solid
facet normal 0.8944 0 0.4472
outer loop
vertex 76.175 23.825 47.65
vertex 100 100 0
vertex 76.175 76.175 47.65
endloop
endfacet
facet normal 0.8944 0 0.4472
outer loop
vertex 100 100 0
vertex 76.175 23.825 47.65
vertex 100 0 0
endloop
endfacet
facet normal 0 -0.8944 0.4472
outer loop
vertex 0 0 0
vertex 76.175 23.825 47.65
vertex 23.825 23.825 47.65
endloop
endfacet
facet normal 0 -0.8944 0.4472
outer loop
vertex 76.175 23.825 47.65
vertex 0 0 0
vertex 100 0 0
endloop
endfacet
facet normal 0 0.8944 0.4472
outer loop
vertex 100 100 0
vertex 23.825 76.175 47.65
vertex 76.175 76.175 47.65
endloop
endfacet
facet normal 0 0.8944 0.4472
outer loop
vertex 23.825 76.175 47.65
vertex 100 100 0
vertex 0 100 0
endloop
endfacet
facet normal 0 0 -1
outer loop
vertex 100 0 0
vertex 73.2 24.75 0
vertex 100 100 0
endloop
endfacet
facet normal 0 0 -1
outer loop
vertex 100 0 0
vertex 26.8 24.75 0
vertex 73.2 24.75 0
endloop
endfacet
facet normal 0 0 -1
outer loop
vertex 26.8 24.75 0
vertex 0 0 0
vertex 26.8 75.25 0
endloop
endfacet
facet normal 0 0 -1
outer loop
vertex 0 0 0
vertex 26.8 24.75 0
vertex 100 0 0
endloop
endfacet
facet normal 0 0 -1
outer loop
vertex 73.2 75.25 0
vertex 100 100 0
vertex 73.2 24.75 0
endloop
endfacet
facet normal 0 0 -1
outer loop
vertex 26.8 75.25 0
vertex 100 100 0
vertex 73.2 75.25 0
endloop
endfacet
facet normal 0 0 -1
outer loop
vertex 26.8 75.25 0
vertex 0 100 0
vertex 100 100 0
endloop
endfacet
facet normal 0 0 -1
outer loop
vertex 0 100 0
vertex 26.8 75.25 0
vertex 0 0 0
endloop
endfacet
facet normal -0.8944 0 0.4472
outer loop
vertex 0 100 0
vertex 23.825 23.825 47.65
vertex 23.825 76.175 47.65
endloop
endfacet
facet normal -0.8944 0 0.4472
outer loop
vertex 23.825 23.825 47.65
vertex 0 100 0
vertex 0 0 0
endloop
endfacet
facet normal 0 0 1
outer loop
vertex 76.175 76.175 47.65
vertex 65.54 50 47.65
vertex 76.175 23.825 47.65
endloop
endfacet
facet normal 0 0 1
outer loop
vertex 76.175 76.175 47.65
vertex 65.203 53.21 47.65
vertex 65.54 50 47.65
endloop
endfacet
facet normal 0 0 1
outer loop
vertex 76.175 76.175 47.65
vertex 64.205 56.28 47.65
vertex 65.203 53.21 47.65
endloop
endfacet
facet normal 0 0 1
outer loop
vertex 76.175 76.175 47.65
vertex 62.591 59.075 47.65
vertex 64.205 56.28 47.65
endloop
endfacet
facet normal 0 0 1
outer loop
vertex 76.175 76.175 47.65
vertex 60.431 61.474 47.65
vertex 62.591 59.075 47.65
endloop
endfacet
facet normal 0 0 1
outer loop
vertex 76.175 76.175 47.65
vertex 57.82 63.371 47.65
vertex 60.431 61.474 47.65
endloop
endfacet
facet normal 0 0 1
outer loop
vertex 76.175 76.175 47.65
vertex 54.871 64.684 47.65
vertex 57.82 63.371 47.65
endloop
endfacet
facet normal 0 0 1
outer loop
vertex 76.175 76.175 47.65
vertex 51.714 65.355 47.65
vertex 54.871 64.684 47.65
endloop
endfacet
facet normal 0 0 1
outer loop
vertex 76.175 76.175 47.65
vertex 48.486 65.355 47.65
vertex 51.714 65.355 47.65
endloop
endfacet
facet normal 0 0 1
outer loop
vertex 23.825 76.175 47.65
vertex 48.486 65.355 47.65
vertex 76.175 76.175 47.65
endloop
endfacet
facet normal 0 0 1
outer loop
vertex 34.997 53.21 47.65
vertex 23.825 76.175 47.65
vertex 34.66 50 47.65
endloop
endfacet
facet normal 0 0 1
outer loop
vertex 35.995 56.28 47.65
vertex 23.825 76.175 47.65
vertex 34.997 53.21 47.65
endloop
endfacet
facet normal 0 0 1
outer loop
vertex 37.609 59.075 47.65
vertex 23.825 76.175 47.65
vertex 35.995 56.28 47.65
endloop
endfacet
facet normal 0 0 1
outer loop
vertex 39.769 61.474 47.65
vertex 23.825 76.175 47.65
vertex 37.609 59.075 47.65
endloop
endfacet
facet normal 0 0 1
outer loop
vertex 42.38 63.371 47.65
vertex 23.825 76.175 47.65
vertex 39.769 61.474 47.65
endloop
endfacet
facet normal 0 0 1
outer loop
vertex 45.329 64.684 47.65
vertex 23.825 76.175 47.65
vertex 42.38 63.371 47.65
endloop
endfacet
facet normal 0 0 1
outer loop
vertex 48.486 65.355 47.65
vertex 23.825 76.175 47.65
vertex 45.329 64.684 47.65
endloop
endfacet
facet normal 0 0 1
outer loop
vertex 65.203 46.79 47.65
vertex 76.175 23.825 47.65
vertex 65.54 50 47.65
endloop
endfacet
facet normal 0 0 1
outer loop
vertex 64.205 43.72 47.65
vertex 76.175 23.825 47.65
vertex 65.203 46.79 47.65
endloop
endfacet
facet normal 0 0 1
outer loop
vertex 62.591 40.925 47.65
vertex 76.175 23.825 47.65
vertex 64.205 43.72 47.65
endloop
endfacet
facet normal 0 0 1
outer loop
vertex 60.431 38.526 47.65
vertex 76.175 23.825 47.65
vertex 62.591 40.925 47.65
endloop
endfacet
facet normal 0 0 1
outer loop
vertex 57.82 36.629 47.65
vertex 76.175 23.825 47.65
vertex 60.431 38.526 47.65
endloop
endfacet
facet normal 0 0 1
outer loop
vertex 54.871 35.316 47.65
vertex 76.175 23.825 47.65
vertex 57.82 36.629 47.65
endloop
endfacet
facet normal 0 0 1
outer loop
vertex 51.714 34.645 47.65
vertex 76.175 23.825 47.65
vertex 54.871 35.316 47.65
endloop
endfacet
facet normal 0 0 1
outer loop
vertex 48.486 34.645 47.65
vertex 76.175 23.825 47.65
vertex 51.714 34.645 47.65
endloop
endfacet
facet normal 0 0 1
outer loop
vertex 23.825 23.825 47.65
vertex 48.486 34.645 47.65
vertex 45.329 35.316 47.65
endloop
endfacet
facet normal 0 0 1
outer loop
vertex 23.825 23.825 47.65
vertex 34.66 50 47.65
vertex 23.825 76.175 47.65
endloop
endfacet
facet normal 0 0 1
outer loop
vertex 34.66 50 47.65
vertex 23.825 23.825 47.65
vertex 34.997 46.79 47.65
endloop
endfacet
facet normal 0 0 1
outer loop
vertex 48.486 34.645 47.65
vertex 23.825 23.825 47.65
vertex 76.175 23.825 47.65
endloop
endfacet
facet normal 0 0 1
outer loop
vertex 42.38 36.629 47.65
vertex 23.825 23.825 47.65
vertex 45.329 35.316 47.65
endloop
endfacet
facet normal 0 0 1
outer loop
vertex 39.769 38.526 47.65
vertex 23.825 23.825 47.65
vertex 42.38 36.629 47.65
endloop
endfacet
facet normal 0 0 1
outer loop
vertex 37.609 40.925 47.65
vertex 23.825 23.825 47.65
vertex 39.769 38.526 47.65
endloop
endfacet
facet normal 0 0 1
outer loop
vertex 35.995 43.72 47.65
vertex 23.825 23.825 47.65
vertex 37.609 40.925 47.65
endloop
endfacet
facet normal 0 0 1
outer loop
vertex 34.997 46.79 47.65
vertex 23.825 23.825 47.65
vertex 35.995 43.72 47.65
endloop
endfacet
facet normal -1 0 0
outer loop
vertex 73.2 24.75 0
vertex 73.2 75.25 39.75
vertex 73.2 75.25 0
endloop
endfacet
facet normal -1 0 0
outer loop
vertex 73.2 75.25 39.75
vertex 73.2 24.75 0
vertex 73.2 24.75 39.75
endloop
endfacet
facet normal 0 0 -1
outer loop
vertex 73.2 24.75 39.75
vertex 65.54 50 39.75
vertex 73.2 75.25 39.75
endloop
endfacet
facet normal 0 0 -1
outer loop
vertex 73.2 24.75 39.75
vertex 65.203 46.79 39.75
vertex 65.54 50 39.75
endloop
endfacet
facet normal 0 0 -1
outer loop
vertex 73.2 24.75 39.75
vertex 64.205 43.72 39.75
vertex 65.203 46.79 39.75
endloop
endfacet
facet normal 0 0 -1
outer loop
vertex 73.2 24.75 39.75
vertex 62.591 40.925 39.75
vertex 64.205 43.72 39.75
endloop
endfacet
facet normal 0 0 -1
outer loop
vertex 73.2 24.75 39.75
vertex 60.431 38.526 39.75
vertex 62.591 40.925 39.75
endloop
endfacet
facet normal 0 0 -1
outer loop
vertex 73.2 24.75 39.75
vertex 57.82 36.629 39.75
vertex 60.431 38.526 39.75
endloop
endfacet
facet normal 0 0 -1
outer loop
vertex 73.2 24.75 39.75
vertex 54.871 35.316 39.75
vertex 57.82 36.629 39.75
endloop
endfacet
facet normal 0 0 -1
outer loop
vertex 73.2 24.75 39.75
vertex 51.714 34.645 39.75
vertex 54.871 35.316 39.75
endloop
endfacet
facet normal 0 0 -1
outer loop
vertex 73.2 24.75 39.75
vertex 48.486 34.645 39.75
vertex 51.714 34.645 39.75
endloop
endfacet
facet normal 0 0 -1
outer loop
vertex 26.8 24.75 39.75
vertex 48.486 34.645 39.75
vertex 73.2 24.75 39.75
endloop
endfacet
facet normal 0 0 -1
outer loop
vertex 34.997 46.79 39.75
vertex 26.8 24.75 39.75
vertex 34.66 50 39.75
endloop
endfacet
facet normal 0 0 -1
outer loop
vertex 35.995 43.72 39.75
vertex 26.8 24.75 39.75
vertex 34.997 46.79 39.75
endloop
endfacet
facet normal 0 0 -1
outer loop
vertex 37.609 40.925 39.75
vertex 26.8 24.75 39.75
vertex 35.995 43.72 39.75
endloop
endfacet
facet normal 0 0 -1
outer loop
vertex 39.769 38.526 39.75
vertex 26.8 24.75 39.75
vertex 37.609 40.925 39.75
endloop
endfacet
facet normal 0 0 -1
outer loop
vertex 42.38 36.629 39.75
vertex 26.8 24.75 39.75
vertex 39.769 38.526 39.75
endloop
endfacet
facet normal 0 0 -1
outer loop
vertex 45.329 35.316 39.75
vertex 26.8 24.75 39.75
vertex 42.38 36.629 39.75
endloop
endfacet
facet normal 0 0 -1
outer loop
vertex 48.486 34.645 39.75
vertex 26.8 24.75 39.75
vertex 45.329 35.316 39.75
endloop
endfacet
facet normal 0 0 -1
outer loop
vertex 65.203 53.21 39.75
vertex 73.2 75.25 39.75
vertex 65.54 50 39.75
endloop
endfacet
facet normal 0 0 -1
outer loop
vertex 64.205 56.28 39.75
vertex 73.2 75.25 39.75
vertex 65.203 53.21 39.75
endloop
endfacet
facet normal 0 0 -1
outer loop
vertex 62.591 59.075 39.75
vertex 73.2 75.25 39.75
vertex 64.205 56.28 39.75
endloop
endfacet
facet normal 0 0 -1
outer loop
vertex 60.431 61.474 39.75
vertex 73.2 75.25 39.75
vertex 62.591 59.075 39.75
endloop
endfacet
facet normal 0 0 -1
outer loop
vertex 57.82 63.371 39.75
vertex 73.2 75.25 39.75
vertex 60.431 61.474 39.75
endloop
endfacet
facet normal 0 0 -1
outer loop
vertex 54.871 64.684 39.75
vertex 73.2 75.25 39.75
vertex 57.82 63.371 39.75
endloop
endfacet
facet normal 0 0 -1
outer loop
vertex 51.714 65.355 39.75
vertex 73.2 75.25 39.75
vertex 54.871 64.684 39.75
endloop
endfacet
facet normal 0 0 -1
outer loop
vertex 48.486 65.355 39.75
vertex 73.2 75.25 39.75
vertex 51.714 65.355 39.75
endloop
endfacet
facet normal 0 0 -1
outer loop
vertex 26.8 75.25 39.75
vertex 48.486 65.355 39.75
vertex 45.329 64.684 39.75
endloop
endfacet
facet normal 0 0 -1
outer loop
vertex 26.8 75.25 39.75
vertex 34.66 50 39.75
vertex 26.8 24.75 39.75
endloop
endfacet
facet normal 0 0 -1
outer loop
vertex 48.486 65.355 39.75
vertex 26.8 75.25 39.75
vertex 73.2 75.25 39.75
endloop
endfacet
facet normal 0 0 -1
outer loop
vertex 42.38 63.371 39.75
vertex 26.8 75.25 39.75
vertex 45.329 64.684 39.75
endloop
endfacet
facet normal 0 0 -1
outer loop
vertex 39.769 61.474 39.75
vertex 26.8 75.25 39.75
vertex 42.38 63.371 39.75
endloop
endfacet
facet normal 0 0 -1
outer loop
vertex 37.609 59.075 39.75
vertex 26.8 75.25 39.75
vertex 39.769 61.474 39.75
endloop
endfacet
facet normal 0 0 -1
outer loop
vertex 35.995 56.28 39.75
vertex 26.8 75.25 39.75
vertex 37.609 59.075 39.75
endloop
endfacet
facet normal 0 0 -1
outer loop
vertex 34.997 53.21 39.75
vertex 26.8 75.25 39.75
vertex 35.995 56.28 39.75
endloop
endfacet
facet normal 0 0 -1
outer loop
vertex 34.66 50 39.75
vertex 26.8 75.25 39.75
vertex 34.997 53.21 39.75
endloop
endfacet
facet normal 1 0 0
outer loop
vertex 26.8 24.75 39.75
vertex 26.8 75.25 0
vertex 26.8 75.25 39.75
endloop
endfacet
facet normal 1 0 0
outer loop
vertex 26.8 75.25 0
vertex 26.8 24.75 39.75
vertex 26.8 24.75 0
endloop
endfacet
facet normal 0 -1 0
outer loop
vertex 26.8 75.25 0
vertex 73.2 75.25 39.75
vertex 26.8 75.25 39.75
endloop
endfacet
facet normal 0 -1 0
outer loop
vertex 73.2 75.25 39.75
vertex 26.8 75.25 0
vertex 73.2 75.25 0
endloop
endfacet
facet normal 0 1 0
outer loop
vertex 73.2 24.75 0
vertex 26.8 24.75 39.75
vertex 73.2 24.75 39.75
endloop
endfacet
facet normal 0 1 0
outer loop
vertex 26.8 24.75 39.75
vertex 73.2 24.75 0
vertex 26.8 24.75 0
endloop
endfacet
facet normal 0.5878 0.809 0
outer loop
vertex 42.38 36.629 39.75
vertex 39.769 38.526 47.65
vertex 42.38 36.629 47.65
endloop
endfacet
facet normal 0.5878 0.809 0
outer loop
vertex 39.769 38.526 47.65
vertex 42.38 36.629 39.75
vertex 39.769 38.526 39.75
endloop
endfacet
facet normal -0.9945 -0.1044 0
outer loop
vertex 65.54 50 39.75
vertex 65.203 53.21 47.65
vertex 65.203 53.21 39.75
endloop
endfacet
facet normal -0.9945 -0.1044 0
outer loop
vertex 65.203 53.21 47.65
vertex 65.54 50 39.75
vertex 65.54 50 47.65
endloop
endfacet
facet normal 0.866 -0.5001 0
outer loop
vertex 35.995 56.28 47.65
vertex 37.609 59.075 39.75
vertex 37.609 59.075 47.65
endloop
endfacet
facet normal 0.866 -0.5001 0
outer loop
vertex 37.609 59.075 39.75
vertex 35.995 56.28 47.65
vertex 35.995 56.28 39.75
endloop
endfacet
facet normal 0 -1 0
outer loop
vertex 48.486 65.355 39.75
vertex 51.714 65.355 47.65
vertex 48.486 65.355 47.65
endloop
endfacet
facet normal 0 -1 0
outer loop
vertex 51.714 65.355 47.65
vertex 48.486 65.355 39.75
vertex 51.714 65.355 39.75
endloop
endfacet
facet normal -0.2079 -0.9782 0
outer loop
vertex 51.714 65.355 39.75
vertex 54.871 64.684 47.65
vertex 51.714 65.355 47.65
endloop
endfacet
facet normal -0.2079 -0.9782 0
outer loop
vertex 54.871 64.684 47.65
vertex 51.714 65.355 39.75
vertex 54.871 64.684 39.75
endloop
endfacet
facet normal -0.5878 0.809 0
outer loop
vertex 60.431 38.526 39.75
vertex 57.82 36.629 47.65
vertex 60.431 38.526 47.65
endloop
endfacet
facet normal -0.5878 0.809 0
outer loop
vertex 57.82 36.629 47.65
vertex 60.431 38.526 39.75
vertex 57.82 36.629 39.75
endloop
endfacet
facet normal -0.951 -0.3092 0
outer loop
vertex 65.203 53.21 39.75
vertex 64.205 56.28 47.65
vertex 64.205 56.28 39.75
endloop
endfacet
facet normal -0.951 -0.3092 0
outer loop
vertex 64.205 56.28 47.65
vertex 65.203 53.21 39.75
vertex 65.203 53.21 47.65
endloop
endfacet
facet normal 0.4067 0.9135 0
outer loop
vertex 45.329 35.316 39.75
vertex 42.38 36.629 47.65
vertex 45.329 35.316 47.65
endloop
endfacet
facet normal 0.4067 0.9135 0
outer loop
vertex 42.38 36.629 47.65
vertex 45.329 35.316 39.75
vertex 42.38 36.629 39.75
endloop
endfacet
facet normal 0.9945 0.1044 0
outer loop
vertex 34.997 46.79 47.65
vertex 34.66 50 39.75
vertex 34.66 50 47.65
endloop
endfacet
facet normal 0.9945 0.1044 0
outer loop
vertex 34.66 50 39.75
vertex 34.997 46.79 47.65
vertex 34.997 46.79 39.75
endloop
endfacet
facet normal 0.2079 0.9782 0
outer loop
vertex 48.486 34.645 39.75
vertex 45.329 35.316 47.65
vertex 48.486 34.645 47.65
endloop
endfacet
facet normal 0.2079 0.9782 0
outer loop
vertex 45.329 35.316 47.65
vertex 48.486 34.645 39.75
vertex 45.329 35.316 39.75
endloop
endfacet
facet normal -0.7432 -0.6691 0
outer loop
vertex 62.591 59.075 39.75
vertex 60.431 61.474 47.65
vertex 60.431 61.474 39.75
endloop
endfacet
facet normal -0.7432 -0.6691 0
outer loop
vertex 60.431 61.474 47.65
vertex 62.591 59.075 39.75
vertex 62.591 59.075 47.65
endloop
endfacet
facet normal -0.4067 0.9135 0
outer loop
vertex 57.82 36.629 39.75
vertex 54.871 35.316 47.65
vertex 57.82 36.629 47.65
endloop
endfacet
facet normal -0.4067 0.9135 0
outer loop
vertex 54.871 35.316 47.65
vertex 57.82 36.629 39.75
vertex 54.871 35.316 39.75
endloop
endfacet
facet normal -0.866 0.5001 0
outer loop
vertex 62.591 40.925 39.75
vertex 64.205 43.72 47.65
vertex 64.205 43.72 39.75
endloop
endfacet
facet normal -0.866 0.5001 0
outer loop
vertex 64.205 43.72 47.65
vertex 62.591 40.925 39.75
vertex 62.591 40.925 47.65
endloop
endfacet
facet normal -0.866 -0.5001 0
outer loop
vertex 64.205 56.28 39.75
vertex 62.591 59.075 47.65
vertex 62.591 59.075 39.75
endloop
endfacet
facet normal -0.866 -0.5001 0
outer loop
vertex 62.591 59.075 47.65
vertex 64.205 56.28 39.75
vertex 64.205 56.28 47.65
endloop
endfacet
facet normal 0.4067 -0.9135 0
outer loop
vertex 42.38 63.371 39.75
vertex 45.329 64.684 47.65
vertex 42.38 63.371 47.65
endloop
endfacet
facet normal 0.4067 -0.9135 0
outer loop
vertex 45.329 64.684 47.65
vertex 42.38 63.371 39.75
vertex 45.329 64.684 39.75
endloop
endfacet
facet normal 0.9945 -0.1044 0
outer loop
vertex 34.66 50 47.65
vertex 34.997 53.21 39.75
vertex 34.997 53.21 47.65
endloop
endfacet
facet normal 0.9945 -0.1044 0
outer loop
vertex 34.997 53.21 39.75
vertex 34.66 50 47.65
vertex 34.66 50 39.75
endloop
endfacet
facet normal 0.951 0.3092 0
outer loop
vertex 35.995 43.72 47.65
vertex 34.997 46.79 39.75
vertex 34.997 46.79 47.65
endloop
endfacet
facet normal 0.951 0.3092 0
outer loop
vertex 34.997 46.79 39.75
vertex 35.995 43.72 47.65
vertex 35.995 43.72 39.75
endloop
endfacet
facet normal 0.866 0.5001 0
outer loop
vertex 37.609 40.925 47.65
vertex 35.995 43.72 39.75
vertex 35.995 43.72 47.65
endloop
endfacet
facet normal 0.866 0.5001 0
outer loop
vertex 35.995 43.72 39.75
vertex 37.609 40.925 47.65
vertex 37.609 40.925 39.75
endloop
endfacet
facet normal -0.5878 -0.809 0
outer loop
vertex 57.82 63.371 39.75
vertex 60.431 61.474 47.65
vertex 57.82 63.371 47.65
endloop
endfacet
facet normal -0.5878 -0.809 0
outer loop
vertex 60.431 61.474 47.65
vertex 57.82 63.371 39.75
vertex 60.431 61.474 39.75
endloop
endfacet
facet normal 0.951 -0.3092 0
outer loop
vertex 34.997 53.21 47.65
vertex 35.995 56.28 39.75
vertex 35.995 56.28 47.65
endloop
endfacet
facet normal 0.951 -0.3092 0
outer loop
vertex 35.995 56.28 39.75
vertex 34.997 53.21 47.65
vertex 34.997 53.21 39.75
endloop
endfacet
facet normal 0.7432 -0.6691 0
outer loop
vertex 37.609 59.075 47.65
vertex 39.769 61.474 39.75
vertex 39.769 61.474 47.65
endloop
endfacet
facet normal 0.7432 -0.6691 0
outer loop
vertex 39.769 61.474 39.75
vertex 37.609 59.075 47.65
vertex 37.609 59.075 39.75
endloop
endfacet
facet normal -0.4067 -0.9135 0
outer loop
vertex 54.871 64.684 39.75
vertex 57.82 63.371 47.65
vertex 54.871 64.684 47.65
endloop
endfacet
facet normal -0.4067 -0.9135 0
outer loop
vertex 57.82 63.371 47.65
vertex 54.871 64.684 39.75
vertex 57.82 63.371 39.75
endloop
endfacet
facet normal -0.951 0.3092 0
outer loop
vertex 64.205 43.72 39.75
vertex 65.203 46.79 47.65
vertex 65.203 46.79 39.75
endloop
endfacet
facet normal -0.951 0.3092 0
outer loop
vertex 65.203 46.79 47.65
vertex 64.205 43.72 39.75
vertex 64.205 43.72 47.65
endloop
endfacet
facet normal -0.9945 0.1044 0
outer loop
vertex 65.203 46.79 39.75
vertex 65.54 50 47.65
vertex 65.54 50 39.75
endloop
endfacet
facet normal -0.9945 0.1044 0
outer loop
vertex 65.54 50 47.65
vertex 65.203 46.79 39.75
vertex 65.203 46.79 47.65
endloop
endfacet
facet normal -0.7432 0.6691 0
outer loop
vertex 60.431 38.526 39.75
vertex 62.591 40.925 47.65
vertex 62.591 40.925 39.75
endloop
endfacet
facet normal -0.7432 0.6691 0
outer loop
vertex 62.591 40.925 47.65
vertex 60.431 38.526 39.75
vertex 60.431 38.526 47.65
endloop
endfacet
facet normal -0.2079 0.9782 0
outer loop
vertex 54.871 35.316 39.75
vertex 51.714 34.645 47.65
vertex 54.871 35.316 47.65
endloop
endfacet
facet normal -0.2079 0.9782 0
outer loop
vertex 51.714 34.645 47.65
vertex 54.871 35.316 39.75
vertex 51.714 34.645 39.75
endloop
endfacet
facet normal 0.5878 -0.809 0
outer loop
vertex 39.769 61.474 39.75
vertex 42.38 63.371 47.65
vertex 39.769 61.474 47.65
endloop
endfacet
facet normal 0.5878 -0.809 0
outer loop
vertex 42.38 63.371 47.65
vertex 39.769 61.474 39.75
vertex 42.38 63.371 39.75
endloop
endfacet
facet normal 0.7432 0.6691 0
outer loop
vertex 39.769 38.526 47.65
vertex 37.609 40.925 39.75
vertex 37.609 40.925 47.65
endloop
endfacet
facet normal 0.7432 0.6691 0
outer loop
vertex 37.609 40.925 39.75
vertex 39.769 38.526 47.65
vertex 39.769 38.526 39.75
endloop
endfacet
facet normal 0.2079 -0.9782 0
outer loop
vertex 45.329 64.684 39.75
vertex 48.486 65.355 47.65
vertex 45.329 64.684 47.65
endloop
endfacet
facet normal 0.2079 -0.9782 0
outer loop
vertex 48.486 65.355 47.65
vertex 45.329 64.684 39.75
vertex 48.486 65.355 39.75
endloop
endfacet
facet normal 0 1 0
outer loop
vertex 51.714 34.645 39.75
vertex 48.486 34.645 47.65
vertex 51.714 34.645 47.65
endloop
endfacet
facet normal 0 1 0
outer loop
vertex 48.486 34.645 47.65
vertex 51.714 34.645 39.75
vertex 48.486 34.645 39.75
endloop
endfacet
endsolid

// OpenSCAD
pyramidSide = 100;
module button(){
//actual 45.37, 49.57, 38.75
//cylinder actual diameter: 29.88, 
// distance from nut: 7.9
cube([46.4,50.5,39.75]);
translate([23.3,25.25,39.75])
cylinder(20,d=30.88);
}
module pyramid(pSide){
    polyhedron(
    points=[ [pSide,pSide,0],
             [pSide,0,0],
             [0,0,0],
             [0,pSide,0],
             [pSide/2,pSide/2,pSide]  ],
    faces=[ [0,1,4],
            [1,2,4],
            [2,3,4],
            [3,0,4],
            [3,2,1,0] ]
  );
}
difference(){
difference(){
pyramid(pyramidSide);
translate([0,0,47.65])
cube(1000,1000,1000);
}
//these expressions in this translate center the buttons based on the pyramid size.
translate([(pyramidSide-46.4)/2,(pyramidSide-50.5)/2,0])
button();
}
